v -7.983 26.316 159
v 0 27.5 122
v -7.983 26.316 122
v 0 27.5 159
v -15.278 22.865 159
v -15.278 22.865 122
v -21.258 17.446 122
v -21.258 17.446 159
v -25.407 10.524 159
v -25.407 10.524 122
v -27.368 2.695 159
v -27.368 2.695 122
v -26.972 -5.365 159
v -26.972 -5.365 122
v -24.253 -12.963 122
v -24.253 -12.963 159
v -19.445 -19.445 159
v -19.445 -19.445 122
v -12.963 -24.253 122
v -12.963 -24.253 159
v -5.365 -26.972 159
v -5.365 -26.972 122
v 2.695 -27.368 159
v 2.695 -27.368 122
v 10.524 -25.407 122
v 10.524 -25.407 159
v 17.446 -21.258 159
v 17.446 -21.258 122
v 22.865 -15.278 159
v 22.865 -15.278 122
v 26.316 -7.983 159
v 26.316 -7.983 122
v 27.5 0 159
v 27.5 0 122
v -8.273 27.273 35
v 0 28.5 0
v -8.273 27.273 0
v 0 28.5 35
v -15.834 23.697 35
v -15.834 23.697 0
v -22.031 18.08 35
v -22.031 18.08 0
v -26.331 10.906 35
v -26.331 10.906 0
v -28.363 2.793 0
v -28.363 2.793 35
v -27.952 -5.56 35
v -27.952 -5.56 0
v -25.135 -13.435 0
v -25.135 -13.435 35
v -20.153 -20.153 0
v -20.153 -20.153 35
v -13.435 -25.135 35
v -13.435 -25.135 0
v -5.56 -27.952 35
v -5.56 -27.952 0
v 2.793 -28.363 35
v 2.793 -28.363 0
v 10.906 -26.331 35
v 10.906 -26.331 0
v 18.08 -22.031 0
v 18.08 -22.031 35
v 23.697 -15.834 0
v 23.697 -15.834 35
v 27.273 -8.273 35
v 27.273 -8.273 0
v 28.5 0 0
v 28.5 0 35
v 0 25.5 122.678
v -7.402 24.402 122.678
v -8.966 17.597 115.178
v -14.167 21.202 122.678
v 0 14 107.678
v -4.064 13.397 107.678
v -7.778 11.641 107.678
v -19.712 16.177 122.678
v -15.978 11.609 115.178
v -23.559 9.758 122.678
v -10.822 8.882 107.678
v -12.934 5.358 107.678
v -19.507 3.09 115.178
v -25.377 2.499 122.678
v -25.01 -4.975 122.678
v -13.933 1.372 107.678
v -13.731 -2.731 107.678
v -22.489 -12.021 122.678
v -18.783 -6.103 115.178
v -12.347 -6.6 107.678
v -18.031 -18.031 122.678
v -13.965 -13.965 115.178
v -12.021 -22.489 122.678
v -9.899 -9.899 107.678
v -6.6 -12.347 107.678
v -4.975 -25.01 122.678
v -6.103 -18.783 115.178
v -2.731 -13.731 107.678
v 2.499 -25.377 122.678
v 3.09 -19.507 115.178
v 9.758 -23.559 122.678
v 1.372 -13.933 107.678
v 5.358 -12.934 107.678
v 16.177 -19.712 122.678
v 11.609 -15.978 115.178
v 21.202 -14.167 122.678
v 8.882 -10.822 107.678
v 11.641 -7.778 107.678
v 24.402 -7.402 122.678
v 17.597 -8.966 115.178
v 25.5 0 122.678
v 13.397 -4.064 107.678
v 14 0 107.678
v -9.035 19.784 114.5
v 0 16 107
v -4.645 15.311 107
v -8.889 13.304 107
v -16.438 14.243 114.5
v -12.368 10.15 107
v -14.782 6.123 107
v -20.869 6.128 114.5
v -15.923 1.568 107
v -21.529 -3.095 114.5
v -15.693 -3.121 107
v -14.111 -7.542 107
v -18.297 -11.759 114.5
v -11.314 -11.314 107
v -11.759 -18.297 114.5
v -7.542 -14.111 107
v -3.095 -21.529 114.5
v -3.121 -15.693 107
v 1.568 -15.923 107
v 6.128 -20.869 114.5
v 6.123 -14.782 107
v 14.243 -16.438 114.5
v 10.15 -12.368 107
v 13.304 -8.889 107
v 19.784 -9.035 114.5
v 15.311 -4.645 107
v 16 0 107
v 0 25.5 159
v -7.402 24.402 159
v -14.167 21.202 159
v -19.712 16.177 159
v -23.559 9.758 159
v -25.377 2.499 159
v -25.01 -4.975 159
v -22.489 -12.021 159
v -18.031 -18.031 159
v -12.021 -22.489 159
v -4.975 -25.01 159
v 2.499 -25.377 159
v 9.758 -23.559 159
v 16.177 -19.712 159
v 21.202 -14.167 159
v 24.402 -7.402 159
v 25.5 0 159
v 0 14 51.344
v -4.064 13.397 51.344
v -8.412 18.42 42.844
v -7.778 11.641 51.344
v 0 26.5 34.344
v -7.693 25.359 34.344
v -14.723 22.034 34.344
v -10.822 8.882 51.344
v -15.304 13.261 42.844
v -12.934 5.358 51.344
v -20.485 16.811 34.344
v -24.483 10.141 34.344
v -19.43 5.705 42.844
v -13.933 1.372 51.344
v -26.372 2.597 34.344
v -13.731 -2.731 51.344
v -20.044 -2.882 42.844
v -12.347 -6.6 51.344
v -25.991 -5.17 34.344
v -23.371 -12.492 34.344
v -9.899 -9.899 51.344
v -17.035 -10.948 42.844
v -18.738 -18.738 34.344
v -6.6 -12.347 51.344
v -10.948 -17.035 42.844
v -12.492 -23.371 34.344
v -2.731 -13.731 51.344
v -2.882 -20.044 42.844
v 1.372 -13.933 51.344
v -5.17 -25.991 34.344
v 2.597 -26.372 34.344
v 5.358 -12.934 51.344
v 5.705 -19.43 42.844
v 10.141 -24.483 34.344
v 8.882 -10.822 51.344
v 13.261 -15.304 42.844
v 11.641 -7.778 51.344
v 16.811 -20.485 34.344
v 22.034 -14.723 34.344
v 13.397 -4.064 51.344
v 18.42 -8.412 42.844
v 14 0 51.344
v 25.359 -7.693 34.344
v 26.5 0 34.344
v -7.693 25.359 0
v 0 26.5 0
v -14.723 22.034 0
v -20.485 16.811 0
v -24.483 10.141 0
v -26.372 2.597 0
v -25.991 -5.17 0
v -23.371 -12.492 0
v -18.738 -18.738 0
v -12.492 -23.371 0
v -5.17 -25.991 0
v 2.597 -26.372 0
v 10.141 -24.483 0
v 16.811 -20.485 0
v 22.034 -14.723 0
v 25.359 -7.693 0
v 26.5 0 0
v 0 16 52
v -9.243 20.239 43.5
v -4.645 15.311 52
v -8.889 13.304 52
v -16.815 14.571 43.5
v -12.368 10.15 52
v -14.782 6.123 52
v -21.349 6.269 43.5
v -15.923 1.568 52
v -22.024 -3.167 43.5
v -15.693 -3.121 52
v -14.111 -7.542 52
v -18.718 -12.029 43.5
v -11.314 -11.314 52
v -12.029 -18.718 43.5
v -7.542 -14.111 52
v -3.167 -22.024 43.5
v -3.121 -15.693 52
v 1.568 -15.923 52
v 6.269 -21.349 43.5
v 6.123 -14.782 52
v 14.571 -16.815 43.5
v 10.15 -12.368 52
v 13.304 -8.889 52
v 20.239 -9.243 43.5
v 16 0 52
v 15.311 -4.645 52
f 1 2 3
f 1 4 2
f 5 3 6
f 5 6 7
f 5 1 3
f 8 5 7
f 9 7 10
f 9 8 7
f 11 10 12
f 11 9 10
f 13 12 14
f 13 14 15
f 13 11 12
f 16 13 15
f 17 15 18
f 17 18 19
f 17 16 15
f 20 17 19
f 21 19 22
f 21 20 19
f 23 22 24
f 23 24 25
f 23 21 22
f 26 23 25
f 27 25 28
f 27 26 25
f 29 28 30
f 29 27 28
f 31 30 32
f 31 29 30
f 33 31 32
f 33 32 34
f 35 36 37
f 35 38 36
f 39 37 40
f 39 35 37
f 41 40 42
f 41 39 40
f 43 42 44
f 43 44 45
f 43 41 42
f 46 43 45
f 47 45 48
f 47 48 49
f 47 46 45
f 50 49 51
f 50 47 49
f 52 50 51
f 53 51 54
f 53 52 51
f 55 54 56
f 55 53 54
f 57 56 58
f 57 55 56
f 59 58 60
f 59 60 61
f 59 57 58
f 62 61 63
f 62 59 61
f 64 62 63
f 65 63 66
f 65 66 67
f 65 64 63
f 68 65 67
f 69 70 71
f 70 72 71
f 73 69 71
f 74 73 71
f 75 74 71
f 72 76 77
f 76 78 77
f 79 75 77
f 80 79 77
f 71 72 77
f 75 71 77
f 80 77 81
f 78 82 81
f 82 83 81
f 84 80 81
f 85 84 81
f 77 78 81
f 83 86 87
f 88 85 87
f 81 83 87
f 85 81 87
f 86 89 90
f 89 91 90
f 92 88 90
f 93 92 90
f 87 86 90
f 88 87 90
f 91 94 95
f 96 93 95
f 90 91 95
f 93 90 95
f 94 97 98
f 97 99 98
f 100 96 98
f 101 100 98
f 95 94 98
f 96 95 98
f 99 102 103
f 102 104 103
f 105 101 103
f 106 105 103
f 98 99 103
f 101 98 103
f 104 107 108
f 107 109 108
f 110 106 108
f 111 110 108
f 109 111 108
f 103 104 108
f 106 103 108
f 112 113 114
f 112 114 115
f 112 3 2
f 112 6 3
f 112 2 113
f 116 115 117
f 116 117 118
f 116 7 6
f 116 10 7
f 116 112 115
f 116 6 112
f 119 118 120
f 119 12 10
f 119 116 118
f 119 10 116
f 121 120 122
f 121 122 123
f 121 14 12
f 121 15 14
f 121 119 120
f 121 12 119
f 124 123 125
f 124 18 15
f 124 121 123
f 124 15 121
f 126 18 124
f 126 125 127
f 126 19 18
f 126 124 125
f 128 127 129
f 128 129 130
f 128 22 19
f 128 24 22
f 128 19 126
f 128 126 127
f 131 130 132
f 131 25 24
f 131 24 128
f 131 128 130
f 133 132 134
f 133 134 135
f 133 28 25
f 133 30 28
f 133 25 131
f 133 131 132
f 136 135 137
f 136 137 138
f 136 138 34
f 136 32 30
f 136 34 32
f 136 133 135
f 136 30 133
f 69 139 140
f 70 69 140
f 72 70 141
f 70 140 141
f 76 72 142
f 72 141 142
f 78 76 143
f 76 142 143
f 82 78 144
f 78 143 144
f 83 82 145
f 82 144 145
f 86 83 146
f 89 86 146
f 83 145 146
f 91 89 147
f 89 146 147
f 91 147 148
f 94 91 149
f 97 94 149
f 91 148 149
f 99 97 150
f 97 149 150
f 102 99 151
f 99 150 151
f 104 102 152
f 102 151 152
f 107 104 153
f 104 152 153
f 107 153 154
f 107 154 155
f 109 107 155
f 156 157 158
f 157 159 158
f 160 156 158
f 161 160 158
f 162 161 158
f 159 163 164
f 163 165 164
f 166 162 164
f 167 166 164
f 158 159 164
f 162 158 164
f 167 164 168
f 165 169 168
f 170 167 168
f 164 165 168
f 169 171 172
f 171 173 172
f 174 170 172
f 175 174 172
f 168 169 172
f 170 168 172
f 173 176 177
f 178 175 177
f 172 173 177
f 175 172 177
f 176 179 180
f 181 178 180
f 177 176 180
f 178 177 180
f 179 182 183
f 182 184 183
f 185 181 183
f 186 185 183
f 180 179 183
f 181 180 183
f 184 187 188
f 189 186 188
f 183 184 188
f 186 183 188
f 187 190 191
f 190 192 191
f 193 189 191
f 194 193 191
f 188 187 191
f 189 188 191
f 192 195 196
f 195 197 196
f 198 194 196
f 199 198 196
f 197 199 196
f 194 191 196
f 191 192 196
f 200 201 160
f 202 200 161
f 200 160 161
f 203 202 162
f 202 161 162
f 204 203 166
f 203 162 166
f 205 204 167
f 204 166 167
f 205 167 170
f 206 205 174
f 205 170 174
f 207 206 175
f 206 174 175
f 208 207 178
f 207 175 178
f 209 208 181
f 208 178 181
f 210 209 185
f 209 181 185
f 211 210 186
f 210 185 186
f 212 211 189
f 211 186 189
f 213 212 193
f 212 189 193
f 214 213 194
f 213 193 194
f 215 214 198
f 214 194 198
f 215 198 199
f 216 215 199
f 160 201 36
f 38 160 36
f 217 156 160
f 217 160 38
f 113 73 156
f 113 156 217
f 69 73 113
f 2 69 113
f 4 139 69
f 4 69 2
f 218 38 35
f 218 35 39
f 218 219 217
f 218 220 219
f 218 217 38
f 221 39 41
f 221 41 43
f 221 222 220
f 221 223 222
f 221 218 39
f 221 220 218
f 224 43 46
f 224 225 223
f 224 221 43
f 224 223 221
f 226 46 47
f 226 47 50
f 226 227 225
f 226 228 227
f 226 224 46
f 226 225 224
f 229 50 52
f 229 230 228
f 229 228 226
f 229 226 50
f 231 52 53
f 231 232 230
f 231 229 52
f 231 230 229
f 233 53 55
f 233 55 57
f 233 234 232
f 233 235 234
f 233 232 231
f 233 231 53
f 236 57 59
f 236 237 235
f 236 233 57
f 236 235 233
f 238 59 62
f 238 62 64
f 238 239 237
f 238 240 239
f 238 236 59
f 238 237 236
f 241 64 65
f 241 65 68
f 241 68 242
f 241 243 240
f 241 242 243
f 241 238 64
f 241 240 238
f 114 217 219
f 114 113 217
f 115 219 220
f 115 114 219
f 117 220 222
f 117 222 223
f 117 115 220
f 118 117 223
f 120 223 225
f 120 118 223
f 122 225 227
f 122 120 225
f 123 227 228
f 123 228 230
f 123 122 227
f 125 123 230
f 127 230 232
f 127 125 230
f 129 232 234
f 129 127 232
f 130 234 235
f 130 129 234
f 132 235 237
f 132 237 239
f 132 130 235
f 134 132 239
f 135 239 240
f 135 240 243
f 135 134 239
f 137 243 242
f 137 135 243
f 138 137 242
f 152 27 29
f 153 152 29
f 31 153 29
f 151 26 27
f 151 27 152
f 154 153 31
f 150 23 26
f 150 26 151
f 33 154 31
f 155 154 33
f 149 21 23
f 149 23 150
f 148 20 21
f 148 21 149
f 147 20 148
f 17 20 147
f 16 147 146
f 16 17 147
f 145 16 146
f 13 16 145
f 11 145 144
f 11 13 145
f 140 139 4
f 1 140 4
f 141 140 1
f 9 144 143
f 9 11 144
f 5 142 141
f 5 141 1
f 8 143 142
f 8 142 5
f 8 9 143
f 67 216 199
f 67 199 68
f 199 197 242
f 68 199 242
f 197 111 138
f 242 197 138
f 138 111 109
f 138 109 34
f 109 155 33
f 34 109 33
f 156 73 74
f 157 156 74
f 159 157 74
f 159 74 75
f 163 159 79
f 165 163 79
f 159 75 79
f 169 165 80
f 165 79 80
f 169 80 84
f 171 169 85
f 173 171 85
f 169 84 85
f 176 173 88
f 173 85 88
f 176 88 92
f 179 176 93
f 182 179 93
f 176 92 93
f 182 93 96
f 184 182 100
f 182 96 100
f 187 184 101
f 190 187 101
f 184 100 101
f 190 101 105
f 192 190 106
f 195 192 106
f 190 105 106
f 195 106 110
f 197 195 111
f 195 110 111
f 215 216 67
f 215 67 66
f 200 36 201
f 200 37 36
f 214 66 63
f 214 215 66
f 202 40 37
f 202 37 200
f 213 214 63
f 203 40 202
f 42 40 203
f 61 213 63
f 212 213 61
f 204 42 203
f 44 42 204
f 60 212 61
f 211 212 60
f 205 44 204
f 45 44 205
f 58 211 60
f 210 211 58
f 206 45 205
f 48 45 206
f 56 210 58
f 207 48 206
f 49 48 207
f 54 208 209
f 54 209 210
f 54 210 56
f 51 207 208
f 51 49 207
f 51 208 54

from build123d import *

# Parameters (mm, degrees)
F6_ANGLE = 270
F7_T     = -2


with BuildPart() as f6:
    # F5 (on Right) → F6 (revolve)
    with BuildSketch(Plane.YZ):
        Polygon((0, 0), (28.5, 0), (28.5, 35), (16, 52), (16, 107), (27.5, 122), (27.5, 159), (0, 159), align=None)
    revolve(axis=Axis((0, 0, 79.5), (0, 0, 1)), revolution_arc=F6_ANGLE)

    # F7
    f7_openings = [f6.faces().sort_by_distance(p)[0] for p in [
        (0, 12.000093, 78.927374),
        (-3.890454, -3.890454, 159),
        (12.000093, 0, 78.927374),
        (-4.031925, -4.031925, 0),
    ]]
    offset(amount=F7_T, openings=f7_openings, kind=Kind.INTERSECTION)


solid = f6.part
